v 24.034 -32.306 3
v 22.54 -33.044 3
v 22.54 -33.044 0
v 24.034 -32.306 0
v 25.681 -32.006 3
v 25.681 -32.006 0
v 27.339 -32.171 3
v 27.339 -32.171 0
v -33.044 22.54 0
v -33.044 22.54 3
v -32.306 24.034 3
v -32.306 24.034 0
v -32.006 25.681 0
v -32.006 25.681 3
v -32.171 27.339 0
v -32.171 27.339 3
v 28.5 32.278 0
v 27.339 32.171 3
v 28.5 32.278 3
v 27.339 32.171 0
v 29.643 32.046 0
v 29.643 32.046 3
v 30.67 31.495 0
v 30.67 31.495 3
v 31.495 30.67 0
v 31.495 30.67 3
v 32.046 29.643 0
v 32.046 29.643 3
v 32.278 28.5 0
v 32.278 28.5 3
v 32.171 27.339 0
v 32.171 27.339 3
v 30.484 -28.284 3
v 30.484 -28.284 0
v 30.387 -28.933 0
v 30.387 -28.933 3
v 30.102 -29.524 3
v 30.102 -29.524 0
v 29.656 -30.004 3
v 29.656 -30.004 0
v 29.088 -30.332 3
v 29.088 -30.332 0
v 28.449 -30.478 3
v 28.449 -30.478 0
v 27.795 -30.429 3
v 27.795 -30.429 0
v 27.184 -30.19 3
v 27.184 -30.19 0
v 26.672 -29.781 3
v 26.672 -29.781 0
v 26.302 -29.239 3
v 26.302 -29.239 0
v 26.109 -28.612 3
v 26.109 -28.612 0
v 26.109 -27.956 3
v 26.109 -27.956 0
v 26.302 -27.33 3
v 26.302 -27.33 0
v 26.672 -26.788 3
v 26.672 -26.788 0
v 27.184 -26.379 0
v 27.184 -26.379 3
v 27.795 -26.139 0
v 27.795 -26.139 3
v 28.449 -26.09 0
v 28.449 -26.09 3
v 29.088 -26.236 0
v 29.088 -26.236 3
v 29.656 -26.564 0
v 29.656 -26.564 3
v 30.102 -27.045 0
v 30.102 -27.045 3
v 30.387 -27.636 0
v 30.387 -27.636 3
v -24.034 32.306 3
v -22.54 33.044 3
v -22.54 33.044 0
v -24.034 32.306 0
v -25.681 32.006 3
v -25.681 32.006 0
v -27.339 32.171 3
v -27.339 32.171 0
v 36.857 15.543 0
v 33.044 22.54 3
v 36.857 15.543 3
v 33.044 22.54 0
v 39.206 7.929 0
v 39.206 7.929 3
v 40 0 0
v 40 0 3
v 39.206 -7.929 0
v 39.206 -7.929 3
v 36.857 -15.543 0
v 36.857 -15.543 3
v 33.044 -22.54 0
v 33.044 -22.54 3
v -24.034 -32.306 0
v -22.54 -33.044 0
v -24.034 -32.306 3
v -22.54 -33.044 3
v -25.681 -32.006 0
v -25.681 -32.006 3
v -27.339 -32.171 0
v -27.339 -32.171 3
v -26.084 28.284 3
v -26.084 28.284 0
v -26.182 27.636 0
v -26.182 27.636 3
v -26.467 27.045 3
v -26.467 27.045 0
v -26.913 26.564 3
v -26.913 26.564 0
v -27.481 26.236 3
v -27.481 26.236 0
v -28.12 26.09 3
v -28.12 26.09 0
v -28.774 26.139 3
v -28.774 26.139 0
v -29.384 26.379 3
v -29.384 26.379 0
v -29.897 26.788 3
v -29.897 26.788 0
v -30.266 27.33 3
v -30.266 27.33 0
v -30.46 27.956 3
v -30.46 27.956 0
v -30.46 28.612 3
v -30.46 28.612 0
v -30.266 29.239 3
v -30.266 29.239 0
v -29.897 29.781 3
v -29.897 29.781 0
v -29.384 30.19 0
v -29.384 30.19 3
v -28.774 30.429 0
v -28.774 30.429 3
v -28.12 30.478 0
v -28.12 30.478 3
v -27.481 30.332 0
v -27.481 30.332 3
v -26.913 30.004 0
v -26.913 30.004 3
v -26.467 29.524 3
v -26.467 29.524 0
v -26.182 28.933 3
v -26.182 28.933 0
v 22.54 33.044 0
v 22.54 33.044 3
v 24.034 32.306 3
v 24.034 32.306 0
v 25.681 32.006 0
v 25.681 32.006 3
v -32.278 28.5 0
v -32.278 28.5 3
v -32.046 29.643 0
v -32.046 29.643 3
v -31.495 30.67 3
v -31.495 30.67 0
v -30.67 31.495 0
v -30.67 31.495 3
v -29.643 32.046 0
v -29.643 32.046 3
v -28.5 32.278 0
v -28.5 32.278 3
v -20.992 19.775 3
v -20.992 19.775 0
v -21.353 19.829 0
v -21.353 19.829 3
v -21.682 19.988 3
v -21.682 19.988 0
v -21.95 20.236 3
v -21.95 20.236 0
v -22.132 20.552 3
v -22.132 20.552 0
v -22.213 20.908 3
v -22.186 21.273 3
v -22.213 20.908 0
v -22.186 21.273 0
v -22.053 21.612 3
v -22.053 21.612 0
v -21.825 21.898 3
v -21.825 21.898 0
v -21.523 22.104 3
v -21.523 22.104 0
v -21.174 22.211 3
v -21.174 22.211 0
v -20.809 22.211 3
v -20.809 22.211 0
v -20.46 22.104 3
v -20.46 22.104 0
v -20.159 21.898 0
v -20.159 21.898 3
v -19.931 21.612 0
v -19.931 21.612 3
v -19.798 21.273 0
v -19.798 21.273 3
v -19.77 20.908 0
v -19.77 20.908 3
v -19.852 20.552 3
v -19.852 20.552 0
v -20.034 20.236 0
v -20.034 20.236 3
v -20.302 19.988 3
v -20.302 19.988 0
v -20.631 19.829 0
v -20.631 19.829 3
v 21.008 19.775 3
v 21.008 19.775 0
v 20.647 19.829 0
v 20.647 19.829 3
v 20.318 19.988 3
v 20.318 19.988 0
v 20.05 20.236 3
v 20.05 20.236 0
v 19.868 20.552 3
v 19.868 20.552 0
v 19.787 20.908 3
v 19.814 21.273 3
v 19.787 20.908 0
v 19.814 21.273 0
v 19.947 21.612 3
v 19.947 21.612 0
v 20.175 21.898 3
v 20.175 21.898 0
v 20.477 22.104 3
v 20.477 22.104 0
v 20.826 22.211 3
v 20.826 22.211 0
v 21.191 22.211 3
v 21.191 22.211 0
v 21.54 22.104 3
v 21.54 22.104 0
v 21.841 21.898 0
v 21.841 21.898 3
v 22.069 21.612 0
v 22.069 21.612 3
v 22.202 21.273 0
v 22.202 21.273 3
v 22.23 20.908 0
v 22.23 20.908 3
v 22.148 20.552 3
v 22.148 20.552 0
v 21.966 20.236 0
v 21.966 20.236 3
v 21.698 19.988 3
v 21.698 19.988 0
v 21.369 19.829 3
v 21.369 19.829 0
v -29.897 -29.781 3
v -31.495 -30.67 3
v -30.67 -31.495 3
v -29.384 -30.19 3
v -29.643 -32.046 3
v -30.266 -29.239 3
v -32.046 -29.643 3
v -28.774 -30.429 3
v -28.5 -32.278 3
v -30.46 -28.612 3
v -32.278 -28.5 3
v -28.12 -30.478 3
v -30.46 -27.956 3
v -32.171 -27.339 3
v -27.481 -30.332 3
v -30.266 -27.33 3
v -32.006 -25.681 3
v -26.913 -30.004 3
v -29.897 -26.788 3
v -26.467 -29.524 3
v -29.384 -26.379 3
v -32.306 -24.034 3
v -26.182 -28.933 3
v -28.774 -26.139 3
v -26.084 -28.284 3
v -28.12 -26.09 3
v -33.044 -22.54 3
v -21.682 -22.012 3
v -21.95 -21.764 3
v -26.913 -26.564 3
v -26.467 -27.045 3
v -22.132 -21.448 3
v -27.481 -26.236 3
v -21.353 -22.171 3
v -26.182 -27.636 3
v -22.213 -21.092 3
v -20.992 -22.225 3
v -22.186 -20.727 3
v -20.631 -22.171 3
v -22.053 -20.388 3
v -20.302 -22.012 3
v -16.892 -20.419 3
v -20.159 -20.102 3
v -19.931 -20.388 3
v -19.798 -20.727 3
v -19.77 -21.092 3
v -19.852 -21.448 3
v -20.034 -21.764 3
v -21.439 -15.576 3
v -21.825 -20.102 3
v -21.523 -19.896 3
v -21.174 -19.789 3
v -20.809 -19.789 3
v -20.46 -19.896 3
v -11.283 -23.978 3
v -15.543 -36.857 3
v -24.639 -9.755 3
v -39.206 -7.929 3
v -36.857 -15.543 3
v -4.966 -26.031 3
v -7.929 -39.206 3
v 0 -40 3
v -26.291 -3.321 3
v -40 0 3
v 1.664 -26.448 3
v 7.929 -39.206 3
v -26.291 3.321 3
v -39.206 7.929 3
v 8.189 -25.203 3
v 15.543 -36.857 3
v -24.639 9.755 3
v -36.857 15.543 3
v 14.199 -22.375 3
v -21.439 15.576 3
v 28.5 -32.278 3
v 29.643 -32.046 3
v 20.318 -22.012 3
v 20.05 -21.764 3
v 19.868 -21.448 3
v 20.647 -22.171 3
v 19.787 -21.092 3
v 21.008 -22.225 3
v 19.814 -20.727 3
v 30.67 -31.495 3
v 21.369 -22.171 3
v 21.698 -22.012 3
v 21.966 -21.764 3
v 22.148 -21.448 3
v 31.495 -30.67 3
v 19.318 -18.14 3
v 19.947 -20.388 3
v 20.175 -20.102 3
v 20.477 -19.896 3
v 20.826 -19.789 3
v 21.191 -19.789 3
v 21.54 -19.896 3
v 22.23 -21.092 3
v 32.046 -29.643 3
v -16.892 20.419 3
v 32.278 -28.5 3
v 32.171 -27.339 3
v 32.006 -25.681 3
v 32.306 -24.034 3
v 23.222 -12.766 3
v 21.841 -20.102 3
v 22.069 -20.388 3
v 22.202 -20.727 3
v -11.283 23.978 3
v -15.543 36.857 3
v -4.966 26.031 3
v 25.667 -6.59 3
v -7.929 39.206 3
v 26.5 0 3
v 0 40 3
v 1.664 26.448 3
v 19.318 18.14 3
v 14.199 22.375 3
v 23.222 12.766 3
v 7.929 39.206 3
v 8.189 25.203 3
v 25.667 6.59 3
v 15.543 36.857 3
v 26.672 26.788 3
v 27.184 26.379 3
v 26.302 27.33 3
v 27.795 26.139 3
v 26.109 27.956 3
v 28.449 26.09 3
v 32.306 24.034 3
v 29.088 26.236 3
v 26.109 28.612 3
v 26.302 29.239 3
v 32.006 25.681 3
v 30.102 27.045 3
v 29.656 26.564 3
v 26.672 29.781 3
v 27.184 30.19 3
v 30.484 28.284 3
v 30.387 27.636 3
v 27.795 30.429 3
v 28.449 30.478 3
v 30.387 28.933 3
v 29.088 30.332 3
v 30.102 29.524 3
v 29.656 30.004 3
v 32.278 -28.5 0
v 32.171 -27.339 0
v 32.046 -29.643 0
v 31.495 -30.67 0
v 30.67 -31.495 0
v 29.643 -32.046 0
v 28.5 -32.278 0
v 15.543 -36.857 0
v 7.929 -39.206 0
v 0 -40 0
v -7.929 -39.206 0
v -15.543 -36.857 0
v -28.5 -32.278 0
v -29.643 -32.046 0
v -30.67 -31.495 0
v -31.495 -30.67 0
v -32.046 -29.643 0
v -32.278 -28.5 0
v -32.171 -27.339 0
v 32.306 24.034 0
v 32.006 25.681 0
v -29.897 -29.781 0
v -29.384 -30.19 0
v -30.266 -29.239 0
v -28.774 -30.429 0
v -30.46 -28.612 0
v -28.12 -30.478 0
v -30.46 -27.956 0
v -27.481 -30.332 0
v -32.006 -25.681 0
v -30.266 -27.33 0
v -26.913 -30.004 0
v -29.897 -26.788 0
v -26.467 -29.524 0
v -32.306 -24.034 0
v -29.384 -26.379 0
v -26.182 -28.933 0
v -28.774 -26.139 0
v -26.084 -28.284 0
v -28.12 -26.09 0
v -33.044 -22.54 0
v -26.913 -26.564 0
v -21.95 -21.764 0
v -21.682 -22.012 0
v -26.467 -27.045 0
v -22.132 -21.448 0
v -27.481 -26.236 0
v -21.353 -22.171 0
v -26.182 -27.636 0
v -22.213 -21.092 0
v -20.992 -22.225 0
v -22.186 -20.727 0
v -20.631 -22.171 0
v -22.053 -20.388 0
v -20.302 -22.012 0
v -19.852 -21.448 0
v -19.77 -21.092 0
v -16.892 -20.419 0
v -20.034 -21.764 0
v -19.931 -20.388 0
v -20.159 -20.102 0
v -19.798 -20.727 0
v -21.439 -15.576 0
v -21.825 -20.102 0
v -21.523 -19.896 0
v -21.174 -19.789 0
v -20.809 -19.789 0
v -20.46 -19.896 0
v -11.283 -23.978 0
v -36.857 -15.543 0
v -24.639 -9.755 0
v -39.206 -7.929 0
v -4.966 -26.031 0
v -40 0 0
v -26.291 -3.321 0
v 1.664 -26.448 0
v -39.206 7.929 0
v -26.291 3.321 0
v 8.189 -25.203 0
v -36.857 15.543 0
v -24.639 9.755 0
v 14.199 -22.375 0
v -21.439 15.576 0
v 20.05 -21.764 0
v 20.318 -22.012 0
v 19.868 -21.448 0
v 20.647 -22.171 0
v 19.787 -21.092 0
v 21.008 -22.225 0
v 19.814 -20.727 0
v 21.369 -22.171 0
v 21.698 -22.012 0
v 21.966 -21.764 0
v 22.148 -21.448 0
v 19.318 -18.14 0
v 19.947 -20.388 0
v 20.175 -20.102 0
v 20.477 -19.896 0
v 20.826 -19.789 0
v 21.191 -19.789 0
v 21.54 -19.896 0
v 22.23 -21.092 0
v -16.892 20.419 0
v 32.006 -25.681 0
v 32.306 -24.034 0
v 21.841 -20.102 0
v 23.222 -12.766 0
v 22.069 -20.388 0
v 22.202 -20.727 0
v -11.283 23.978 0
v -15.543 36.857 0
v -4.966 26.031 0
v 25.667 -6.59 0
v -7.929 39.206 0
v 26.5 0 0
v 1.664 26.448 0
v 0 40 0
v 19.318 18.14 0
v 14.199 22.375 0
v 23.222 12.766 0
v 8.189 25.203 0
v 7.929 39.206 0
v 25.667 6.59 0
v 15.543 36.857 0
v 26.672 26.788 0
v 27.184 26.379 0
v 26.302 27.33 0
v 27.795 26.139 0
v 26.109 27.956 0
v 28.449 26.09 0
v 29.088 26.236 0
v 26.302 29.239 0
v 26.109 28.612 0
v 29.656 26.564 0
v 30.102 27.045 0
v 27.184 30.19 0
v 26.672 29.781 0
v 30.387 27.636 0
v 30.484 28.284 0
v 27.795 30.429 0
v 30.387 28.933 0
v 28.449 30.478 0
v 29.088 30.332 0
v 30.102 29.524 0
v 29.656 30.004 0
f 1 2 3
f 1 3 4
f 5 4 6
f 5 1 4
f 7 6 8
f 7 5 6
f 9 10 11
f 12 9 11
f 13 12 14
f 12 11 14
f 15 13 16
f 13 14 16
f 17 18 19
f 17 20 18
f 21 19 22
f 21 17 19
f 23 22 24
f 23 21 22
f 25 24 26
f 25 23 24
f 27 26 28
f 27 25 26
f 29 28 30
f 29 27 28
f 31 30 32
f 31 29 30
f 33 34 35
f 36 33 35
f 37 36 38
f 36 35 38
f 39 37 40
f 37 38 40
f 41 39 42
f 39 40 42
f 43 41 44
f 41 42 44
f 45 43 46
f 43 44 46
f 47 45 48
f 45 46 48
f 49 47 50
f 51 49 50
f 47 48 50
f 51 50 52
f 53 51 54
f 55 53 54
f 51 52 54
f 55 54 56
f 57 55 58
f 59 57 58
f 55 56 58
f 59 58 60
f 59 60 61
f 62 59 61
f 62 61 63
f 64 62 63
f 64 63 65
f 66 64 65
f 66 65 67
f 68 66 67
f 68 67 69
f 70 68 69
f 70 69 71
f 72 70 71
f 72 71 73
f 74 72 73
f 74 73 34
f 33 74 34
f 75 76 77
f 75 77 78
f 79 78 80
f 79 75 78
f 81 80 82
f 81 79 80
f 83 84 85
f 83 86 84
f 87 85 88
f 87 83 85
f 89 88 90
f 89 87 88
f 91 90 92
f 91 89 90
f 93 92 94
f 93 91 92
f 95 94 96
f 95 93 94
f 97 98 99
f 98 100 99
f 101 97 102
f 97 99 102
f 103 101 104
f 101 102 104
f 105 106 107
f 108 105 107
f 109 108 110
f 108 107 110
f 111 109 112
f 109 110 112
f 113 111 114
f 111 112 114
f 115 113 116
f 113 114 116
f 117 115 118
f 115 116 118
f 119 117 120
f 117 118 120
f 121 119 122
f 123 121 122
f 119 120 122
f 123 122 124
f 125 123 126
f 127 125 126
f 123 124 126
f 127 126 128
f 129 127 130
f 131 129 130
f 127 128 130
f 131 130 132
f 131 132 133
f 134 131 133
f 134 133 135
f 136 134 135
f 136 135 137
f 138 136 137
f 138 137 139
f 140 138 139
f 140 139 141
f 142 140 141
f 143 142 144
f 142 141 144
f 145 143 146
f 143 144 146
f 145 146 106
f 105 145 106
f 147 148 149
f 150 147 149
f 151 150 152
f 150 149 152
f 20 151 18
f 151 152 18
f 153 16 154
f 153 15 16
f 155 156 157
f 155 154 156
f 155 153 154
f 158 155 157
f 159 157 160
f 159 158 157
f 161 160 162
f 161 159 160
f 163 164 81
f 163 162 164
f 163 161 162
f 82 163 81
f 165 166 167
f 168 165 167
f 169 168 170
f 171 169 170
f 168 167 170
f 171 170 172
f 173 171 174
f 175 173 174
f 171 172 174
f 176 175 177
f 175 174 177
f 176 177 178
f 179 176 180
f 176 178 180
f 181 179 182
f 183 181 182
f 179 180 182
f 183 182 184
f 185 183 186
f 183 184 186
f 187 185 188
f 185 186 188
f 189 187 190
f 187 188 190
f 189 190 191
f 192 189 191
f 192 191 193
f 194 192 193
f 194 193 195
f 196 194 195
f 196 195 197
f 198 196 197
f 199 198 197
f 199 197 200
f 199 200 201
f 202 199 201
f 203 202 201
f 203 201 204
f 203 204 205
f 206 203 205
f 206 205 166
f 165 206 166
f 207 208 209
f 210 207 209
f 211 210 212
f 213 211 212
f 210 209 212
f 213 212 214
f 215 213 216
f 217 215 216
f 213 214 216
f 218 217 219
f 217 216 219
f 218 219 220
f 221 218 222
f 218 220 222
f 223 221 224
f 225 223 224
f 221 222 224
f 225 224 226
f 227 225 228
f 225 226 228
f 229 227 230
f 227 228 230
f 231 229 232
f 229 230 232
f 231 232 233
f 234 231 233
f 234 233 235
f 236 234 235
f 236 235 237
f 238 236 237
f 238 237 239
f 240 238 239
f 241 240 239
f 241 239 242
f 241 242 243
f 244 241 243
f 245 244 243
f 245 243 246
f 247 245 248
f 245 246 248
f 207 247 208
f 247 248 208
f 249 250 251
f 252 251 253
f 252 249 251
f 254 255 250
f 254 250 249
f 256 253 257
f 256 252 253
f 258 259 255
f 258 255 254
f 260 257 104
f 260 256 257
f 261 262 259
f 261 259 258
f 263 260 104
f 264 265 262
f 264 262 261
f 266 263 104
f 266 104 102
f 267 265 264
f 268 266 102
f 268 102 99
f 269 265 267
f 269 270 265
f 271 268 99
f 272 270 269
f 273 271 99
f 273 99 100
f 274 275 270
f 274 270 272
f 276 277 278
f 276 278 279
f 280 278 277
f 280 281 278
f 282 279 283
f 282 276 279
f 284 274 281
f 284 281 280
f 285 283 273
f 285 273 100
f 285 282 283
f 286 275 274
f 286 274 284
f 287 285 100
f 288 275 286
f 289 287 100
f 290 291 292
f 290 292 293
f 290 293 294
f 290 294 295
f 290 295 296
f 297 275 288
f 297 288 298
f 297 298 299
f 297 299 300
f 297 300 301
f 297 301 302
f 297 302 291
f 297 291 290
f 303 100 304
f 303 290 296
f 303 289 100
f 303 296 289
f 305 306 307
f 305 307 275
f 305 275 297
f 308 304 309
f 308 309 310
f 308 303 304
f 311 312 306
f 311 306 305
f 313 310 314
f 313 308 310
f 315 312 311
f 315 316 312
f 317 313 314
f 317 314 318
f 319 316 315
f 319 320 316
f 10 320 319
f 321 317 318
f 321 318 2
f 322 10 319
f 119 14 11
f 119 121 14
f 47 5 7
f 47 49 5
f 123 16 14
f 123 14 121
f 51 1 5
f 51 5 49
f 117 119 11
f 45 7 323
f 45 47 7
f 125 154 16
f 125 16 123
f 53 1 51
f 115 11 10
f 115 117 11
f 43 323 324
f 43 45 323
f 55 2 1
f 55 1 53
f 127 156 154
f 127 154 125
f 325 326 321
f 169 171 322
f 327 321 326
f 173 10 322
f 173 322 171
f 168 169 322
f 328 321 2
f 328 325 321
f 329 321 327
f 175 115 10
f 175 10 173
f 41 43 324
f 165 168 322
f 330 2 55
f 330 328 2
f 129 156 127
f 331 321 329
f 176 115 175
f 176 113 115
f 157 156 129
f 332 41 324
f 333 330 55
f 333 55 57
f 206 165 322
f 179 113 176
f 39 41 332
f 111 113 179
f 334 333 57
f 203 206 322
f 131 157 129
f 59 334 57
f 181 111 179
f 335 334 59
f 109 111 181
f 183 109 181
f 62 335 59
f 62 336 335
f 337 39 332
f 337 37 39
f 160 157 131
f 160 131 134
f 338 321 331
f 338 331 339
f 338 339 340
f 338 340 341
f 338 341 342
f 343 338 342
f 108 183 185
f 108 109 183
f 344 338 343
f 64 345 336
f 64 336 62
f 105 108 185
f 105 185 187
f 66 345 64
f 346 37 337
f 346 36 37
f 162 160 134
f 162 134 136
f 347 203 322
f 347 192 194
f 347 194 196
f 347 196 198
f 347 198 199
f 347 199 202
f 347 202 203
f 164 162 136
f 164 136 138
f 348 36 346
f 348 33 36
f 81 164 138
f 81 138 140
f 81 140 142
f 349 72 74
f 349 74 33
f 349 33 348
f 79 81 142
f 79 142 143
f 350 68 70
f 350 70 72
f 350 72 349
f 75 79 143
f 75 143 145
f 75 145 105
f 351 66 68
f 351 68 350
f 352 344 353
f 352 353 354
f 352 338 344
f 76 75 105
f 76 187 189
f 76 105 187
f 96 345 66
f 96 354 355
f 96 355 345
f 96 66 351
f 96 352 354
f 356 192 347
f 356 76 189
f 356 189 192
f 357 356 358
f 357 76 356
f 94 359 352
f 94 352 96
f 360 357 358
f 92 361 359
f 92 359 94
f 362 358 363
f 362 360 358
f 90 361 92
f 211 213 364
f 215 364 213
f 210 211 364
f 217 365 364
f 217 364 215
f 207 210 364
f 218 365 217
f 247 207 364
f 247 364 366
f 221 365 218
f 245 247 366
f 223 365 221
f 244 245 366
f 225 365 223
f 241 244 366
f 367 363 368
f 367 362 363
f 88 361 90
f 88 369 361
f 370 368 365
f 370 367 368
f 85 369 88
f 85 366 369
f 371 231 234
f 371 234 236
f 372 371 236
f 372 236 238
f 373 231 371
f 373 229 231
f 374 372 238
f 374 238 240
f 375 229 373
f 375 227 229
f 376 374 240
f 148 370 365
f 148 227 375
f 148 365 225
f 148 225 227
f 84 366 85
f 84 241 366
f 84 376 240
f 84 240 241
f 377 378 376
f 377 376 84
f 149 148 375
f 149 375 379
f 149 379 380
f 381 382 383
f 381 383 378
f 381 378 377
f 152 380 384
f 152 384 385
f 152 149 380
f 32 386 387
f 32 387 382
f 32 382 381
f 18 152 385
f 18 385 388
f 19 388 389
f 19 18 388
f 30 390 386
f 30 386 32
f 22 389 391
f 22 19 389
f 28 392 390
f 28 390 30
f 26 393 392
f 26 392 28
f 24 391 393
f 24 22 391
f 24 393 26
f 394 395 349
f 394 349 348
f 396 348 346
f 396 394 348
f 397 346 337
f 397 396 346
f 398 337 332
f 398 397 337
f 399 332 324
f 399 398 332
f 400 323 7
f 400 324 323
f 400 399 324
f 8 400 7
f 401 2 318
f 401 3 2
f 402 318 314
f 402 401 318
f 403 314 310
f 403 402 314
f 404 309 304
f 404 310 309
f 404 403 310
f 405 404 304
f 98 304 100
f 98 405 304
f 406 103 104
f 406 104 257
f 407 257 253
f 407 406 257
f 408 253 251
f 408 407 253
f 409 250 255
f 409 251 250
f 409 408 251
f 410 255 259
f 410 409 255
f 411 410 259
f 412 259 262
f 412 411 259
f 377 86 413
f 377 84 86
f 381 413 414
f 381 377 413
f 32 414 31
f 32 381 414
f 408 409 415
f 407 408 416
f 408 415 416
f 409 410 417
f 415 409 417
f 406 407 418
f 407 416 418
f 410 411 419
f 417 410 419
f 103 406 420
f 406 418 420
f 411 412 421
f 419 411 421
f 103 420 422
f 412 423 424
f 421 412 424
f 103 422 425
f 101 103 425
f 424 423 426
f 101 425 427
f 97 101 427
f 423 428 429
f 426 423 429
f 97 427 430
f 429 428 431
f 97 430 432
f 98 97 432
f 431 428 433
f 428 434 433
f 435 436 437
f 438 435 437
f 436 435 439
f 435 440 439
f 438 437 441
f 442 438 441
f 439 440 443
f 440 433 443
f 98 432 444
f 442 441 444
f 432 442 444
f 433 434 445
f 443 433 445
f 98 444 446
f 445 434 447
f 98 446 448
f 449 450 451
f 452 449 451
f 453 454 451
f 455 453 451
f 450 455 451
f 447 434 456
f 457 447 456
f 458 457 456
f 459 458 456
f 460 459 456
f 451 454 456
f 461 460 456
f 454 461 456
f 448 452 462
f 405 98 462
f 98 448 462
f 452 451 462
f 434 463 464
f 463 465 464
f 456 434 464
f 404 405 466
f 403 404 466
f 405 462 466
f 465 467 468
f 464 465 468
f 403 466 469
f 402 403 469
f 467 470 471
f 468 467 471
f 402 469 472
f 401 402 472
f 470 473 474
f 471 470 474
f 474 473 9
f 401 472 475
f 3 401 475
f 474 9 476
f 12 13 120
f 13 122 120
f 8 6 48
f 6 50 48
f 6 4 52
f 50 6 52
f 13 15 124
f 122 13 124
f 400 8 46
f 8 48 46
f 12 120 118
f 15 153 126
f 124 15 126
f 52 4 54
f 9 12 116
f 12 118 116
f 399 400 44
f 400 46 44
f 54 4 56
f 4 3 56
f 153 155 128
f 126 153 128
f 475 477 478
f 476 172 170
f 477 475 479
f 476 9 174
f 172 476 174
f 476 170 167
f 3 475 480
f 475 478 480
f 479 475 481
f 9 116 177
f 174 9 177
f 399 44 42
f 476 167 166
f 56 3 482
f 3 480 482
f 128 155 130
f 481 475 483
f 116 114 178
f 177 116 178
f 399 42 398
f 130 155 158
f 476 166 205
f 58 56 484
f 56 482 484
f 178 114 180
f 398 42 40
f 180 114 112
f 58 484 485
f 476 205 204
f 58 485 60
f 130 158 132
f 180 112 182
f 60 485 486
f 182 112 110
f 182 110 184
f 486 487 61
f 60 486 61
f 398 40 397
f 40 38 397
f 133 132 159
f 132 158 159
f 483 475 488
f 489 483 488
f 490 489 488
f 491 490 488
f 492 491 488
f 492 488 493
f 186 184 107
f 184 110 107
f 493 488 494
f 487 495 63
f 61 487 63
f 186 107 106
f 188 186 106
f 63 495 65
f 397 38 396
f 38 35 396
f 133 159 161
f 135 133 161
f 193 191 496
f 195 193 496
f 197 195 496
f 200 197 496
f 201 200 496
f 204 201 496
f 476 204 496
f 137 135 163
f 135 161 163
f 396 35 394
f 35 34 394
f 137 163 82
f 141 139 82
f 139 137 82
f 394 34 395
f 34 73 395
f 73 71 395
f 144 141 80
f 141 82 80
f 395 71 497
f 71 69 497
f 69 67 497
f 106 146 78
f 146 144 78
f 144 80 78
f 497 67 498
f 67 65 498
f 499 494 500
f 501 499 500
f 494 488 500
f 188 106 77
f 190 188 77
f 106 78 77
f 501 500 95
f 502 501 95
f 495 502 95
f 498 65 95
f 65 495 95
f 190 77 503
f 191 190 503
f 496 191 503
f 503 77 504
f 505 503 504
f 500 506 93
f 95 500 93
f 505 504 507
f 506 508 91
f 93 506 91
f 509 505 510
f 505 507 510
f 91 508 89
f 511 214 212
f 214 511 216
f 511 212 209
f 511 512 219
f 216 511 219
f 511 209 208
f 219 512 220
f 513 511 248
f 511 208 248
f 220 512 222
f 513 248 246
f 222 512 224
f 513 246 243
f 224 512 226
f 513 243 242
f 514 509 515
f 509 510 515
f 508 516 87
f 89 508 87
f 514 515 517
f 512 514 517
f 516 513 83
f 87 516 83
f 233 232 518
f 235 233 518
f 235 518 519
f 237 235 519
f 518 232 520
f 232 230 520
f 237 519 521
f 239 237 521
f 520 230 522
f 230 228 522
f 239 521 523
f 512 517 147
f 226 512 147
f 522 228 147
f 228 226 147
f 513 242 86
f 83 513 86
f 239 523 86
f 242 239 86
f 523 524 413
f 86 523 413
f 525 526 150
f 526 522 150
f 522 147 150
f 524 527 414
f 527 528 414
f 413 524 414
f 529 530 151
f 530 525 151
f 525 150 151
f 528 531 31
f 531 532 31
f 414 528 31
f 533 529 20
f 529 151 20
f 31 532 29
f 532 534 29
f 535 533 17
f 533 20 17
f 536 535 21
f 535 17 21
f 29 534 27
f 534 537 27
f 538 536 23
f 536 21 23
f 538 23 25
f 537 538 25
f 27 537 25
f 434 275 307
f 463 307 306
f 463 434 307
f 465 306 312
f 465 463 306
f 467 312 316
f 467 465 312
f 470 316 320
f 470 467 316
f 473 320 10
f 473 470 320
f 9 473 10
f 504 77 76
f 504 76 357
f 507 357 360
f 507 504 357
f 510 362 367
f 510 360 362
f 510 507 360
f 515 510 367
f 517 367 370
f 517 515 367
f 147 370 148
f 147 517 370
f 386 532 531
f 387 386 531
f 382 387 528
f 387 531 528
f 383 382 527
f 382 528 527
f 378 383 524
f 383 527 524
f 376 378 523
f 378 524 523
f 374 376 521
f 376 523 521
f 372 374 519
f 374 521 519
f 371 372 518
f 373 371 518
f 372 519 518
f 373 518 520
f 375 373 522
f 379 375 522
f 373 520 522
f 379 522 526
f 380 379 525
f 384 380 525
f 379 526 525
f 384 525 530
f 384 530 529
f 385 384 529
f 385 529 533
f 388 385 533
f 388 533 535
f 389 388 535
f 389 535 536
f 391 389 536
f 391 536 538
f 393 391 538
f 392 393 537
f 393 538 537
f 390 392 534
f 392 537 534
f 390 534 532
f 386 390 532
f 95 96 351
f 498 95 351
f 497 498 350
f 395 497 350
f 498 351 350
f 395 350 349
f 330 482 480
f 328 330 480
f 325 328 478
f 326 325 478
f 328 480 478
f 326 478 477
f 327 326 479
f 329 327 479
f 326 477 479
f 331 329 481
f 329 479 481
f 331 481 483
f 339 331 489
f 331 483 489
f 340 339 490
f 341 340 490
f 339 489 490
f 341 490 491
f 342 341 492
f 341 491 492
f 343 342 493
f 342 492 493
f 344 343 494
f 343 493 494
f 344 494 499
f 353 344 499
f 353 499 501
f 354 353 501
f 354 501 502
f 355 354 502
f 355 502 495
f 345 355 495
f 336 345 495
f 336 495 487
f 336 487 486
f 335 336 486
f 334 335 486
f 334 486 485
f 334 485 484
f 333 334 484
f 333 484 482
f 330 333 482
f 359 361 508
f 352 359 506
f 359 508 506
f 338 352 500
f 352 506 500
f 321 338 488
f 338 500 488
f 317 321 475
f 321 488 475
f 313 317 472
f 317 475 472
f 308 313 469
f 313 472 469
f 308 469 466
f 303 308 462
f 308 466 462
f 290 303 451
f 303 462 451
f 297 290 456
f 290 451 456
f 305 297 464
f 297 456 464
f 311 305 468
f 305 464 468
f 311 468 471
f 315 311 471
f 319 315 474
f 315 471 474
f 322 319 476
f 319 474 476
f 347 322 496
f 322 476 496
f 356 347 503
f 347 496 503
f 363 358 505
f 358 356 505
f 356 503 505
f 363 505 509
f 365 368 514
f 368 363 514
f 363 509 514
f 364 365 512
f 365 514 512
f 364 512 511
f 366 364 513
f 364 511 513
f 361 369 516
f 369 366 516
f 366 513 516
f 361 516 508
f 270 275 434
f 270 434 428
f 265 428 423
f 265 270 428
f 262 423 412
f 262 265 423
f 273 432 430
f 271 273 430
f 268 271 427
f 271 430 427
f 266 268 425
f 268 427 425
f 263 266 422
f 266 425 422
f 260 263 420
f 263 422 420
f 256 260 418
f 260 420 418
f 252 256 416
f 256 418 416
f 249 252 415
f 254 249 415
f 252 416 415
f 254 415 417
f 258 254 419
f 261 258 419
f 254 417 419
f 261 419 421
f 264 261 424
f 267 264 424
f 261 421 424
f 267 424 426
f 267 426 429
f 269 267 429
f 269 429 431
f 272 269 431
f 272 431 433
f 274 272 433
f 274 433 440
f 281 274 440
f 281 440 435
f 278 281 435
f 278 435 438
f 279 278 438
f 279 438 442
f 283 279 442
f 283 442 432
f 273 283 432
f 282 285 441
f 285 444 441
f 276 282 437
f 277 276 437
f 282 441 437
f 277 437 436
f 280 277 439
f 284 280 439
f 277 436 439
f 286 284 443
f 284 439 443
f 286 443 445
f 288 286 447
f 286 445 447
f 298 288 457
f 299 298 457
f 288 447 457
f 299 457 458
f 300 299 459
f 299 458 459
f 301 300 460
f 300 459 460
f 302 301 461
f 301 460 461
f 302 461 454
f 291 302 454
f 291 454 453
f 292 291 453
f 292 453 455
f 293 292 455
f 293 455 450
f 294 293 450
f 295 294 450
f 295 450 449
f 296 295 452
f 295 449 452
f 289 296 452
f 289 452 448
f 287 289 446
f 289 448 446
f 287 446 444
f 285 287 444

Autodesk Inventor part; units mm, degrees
ref_plane "YZ Plane" through (0, 0, 0) normal (1, 0, 0) x (0, 1, 0)
ref_plane "XZ Plane" through (0, 0, 0) normal (0, 1, 0) x (-1, 0, 0)
ref_plane "XY Plane" through (0, 0, 0) normal (0, 0, 1) x (1, 0, 0)
sketch "Base" plane through (0, 0, 0) normal (0, 0, 1) x (1, 0, 0)
  line L0 (-56, 0) -> (56, 0)
  line L1 (0, -56) -> (0, 56) construction
  circle A0 centre (0, 0) radius 40
  line L2 (0, 0) -> (28.2843, 28.2843) construction
  circle A1 centre (28.2843, 28.2843) radius 2.2
  circle A2 centre (-28.2843, 28.2843) radius 2.2
  circle A3 centre (28.2843, -28.2843) radius 2.2
  circle A4 centre (-28.2843, -28.2843) radius 2.2
  circle A5 centre (28.2843, 28.2843) radius 4
  circle A6 centre (-28.2843, 28.2843) radius 4
  circle A7 centre (28.2843, -28.2843) radius 4
  circle A8 centre (-28.2843, -28.2843) radius 4
  circle A9 centre (0, 0) radius 12.2174 construction
  spline S0 degree 3 number of poles 906
  spline S1 degree 3 number of poles 906
  spline S2 degree 3 number of poles 906
  spline S3 degree 3 number of poles 906
  spline S4 degree 2 number of poles 341
  arc A10 (7.6354, -22.3136) -> (7.8387, -21.1617) centre (9.1457, -21.9862) ccw
  circle A11 centre (0, 0) radius 26.5
  point P0 (0, 0)
  point P1 (25.318, 30.9677)
  point P2 (-25.318, 30.9677)
  point P3 (-30.9677, 25.318)
  point P4 (-40, 0)
  point P5 (40, 0)
  point P6 (30.9677, 25.318)
  point P7 (30.9677, -25.318)
  point P8 (-30.9677, -25.318)
  point P9 (-25.318, -30.9677)
  point P10 (25.318, -30.9677)
  point P11 (-29.7965, 26.6864)
  point P12 (-26.6864, 29.7965)
  point P13 (-26.6864, -29.7965)
  point P14 (-29.7965, -26.6864)
extrude "Plate1" add sketch "Base" along normal blind 3 contours A11 L0 A0 A6 A5 | L0 A0 A7 A8 A11 | A5 A0 A1 | A0 A1 A5 | A7 A0 A3 | A0 A3 A7 | A6 A0 A2 | A0 A2 A6 | A8 A0 A4 | A0 A4 A8
fillet "FilletsFeature" radius 6 8 edges at (-30.9677, 25.318, 1.5) (-30.9677, -25.318, 1.5) (-25.318, -30.9677, 1.5) (25.318, -30.9677, 1.5) (30.9677, -25.318, 1.5) (30.9677, 25.318, 1.5) (25.318, 30.9677, 1.5) (-25.318, 30.9677, 1.5)
sketch "WheelEncoderMount" plane through (0, 0, 3) normal (0, 0, 1) x (1, 0, 0)
  circle A0 centre (-20.9919, -21) radius 1.25 projected
  circle A1 centre (-20.9919, 21) radius 1.25 projected
  circle A2 centre (21.0081, -21) radius 1.25 projected
  circle A3 centre (21.0081, 21) radius 1.25 projected
  circle A4 centre (-20.9919, -21) radius 1.25 projected
  circle A5 centre (-20.9919, 21) radius 1.25 projected
hole "EncoderMountHolesFeature" at (-20.9919, -21, 3) at (-20.9919, 21, 3) at (21.0081, 21, 3) at (21.0081, -21, 3) direction (0, 0, -1) diameter 2.45 end through all
equation "\"d48\" = Thickness"
equation "\"d28\" = Thickness"
equation "\"BendRadius\" = Thickness"
equation "\"BendReliefWidth\" = Thickness"
equation "\"BendReliefDepth\" = 0.5 * Thickness"
equation "\"CornerReliefSize\" = 4 * Thickness"
equation "\"MinimumRemnant\" = 2 * Thickness"
equation "\"TransitionRadius\" = BendRadius"
equation "\"JacobiRadiusSize\" = BendRadius"
equation "\"GapSize\" = Thickness"
equation "\"Thickness\" = 3"
properties part number "CimCoderMount"
